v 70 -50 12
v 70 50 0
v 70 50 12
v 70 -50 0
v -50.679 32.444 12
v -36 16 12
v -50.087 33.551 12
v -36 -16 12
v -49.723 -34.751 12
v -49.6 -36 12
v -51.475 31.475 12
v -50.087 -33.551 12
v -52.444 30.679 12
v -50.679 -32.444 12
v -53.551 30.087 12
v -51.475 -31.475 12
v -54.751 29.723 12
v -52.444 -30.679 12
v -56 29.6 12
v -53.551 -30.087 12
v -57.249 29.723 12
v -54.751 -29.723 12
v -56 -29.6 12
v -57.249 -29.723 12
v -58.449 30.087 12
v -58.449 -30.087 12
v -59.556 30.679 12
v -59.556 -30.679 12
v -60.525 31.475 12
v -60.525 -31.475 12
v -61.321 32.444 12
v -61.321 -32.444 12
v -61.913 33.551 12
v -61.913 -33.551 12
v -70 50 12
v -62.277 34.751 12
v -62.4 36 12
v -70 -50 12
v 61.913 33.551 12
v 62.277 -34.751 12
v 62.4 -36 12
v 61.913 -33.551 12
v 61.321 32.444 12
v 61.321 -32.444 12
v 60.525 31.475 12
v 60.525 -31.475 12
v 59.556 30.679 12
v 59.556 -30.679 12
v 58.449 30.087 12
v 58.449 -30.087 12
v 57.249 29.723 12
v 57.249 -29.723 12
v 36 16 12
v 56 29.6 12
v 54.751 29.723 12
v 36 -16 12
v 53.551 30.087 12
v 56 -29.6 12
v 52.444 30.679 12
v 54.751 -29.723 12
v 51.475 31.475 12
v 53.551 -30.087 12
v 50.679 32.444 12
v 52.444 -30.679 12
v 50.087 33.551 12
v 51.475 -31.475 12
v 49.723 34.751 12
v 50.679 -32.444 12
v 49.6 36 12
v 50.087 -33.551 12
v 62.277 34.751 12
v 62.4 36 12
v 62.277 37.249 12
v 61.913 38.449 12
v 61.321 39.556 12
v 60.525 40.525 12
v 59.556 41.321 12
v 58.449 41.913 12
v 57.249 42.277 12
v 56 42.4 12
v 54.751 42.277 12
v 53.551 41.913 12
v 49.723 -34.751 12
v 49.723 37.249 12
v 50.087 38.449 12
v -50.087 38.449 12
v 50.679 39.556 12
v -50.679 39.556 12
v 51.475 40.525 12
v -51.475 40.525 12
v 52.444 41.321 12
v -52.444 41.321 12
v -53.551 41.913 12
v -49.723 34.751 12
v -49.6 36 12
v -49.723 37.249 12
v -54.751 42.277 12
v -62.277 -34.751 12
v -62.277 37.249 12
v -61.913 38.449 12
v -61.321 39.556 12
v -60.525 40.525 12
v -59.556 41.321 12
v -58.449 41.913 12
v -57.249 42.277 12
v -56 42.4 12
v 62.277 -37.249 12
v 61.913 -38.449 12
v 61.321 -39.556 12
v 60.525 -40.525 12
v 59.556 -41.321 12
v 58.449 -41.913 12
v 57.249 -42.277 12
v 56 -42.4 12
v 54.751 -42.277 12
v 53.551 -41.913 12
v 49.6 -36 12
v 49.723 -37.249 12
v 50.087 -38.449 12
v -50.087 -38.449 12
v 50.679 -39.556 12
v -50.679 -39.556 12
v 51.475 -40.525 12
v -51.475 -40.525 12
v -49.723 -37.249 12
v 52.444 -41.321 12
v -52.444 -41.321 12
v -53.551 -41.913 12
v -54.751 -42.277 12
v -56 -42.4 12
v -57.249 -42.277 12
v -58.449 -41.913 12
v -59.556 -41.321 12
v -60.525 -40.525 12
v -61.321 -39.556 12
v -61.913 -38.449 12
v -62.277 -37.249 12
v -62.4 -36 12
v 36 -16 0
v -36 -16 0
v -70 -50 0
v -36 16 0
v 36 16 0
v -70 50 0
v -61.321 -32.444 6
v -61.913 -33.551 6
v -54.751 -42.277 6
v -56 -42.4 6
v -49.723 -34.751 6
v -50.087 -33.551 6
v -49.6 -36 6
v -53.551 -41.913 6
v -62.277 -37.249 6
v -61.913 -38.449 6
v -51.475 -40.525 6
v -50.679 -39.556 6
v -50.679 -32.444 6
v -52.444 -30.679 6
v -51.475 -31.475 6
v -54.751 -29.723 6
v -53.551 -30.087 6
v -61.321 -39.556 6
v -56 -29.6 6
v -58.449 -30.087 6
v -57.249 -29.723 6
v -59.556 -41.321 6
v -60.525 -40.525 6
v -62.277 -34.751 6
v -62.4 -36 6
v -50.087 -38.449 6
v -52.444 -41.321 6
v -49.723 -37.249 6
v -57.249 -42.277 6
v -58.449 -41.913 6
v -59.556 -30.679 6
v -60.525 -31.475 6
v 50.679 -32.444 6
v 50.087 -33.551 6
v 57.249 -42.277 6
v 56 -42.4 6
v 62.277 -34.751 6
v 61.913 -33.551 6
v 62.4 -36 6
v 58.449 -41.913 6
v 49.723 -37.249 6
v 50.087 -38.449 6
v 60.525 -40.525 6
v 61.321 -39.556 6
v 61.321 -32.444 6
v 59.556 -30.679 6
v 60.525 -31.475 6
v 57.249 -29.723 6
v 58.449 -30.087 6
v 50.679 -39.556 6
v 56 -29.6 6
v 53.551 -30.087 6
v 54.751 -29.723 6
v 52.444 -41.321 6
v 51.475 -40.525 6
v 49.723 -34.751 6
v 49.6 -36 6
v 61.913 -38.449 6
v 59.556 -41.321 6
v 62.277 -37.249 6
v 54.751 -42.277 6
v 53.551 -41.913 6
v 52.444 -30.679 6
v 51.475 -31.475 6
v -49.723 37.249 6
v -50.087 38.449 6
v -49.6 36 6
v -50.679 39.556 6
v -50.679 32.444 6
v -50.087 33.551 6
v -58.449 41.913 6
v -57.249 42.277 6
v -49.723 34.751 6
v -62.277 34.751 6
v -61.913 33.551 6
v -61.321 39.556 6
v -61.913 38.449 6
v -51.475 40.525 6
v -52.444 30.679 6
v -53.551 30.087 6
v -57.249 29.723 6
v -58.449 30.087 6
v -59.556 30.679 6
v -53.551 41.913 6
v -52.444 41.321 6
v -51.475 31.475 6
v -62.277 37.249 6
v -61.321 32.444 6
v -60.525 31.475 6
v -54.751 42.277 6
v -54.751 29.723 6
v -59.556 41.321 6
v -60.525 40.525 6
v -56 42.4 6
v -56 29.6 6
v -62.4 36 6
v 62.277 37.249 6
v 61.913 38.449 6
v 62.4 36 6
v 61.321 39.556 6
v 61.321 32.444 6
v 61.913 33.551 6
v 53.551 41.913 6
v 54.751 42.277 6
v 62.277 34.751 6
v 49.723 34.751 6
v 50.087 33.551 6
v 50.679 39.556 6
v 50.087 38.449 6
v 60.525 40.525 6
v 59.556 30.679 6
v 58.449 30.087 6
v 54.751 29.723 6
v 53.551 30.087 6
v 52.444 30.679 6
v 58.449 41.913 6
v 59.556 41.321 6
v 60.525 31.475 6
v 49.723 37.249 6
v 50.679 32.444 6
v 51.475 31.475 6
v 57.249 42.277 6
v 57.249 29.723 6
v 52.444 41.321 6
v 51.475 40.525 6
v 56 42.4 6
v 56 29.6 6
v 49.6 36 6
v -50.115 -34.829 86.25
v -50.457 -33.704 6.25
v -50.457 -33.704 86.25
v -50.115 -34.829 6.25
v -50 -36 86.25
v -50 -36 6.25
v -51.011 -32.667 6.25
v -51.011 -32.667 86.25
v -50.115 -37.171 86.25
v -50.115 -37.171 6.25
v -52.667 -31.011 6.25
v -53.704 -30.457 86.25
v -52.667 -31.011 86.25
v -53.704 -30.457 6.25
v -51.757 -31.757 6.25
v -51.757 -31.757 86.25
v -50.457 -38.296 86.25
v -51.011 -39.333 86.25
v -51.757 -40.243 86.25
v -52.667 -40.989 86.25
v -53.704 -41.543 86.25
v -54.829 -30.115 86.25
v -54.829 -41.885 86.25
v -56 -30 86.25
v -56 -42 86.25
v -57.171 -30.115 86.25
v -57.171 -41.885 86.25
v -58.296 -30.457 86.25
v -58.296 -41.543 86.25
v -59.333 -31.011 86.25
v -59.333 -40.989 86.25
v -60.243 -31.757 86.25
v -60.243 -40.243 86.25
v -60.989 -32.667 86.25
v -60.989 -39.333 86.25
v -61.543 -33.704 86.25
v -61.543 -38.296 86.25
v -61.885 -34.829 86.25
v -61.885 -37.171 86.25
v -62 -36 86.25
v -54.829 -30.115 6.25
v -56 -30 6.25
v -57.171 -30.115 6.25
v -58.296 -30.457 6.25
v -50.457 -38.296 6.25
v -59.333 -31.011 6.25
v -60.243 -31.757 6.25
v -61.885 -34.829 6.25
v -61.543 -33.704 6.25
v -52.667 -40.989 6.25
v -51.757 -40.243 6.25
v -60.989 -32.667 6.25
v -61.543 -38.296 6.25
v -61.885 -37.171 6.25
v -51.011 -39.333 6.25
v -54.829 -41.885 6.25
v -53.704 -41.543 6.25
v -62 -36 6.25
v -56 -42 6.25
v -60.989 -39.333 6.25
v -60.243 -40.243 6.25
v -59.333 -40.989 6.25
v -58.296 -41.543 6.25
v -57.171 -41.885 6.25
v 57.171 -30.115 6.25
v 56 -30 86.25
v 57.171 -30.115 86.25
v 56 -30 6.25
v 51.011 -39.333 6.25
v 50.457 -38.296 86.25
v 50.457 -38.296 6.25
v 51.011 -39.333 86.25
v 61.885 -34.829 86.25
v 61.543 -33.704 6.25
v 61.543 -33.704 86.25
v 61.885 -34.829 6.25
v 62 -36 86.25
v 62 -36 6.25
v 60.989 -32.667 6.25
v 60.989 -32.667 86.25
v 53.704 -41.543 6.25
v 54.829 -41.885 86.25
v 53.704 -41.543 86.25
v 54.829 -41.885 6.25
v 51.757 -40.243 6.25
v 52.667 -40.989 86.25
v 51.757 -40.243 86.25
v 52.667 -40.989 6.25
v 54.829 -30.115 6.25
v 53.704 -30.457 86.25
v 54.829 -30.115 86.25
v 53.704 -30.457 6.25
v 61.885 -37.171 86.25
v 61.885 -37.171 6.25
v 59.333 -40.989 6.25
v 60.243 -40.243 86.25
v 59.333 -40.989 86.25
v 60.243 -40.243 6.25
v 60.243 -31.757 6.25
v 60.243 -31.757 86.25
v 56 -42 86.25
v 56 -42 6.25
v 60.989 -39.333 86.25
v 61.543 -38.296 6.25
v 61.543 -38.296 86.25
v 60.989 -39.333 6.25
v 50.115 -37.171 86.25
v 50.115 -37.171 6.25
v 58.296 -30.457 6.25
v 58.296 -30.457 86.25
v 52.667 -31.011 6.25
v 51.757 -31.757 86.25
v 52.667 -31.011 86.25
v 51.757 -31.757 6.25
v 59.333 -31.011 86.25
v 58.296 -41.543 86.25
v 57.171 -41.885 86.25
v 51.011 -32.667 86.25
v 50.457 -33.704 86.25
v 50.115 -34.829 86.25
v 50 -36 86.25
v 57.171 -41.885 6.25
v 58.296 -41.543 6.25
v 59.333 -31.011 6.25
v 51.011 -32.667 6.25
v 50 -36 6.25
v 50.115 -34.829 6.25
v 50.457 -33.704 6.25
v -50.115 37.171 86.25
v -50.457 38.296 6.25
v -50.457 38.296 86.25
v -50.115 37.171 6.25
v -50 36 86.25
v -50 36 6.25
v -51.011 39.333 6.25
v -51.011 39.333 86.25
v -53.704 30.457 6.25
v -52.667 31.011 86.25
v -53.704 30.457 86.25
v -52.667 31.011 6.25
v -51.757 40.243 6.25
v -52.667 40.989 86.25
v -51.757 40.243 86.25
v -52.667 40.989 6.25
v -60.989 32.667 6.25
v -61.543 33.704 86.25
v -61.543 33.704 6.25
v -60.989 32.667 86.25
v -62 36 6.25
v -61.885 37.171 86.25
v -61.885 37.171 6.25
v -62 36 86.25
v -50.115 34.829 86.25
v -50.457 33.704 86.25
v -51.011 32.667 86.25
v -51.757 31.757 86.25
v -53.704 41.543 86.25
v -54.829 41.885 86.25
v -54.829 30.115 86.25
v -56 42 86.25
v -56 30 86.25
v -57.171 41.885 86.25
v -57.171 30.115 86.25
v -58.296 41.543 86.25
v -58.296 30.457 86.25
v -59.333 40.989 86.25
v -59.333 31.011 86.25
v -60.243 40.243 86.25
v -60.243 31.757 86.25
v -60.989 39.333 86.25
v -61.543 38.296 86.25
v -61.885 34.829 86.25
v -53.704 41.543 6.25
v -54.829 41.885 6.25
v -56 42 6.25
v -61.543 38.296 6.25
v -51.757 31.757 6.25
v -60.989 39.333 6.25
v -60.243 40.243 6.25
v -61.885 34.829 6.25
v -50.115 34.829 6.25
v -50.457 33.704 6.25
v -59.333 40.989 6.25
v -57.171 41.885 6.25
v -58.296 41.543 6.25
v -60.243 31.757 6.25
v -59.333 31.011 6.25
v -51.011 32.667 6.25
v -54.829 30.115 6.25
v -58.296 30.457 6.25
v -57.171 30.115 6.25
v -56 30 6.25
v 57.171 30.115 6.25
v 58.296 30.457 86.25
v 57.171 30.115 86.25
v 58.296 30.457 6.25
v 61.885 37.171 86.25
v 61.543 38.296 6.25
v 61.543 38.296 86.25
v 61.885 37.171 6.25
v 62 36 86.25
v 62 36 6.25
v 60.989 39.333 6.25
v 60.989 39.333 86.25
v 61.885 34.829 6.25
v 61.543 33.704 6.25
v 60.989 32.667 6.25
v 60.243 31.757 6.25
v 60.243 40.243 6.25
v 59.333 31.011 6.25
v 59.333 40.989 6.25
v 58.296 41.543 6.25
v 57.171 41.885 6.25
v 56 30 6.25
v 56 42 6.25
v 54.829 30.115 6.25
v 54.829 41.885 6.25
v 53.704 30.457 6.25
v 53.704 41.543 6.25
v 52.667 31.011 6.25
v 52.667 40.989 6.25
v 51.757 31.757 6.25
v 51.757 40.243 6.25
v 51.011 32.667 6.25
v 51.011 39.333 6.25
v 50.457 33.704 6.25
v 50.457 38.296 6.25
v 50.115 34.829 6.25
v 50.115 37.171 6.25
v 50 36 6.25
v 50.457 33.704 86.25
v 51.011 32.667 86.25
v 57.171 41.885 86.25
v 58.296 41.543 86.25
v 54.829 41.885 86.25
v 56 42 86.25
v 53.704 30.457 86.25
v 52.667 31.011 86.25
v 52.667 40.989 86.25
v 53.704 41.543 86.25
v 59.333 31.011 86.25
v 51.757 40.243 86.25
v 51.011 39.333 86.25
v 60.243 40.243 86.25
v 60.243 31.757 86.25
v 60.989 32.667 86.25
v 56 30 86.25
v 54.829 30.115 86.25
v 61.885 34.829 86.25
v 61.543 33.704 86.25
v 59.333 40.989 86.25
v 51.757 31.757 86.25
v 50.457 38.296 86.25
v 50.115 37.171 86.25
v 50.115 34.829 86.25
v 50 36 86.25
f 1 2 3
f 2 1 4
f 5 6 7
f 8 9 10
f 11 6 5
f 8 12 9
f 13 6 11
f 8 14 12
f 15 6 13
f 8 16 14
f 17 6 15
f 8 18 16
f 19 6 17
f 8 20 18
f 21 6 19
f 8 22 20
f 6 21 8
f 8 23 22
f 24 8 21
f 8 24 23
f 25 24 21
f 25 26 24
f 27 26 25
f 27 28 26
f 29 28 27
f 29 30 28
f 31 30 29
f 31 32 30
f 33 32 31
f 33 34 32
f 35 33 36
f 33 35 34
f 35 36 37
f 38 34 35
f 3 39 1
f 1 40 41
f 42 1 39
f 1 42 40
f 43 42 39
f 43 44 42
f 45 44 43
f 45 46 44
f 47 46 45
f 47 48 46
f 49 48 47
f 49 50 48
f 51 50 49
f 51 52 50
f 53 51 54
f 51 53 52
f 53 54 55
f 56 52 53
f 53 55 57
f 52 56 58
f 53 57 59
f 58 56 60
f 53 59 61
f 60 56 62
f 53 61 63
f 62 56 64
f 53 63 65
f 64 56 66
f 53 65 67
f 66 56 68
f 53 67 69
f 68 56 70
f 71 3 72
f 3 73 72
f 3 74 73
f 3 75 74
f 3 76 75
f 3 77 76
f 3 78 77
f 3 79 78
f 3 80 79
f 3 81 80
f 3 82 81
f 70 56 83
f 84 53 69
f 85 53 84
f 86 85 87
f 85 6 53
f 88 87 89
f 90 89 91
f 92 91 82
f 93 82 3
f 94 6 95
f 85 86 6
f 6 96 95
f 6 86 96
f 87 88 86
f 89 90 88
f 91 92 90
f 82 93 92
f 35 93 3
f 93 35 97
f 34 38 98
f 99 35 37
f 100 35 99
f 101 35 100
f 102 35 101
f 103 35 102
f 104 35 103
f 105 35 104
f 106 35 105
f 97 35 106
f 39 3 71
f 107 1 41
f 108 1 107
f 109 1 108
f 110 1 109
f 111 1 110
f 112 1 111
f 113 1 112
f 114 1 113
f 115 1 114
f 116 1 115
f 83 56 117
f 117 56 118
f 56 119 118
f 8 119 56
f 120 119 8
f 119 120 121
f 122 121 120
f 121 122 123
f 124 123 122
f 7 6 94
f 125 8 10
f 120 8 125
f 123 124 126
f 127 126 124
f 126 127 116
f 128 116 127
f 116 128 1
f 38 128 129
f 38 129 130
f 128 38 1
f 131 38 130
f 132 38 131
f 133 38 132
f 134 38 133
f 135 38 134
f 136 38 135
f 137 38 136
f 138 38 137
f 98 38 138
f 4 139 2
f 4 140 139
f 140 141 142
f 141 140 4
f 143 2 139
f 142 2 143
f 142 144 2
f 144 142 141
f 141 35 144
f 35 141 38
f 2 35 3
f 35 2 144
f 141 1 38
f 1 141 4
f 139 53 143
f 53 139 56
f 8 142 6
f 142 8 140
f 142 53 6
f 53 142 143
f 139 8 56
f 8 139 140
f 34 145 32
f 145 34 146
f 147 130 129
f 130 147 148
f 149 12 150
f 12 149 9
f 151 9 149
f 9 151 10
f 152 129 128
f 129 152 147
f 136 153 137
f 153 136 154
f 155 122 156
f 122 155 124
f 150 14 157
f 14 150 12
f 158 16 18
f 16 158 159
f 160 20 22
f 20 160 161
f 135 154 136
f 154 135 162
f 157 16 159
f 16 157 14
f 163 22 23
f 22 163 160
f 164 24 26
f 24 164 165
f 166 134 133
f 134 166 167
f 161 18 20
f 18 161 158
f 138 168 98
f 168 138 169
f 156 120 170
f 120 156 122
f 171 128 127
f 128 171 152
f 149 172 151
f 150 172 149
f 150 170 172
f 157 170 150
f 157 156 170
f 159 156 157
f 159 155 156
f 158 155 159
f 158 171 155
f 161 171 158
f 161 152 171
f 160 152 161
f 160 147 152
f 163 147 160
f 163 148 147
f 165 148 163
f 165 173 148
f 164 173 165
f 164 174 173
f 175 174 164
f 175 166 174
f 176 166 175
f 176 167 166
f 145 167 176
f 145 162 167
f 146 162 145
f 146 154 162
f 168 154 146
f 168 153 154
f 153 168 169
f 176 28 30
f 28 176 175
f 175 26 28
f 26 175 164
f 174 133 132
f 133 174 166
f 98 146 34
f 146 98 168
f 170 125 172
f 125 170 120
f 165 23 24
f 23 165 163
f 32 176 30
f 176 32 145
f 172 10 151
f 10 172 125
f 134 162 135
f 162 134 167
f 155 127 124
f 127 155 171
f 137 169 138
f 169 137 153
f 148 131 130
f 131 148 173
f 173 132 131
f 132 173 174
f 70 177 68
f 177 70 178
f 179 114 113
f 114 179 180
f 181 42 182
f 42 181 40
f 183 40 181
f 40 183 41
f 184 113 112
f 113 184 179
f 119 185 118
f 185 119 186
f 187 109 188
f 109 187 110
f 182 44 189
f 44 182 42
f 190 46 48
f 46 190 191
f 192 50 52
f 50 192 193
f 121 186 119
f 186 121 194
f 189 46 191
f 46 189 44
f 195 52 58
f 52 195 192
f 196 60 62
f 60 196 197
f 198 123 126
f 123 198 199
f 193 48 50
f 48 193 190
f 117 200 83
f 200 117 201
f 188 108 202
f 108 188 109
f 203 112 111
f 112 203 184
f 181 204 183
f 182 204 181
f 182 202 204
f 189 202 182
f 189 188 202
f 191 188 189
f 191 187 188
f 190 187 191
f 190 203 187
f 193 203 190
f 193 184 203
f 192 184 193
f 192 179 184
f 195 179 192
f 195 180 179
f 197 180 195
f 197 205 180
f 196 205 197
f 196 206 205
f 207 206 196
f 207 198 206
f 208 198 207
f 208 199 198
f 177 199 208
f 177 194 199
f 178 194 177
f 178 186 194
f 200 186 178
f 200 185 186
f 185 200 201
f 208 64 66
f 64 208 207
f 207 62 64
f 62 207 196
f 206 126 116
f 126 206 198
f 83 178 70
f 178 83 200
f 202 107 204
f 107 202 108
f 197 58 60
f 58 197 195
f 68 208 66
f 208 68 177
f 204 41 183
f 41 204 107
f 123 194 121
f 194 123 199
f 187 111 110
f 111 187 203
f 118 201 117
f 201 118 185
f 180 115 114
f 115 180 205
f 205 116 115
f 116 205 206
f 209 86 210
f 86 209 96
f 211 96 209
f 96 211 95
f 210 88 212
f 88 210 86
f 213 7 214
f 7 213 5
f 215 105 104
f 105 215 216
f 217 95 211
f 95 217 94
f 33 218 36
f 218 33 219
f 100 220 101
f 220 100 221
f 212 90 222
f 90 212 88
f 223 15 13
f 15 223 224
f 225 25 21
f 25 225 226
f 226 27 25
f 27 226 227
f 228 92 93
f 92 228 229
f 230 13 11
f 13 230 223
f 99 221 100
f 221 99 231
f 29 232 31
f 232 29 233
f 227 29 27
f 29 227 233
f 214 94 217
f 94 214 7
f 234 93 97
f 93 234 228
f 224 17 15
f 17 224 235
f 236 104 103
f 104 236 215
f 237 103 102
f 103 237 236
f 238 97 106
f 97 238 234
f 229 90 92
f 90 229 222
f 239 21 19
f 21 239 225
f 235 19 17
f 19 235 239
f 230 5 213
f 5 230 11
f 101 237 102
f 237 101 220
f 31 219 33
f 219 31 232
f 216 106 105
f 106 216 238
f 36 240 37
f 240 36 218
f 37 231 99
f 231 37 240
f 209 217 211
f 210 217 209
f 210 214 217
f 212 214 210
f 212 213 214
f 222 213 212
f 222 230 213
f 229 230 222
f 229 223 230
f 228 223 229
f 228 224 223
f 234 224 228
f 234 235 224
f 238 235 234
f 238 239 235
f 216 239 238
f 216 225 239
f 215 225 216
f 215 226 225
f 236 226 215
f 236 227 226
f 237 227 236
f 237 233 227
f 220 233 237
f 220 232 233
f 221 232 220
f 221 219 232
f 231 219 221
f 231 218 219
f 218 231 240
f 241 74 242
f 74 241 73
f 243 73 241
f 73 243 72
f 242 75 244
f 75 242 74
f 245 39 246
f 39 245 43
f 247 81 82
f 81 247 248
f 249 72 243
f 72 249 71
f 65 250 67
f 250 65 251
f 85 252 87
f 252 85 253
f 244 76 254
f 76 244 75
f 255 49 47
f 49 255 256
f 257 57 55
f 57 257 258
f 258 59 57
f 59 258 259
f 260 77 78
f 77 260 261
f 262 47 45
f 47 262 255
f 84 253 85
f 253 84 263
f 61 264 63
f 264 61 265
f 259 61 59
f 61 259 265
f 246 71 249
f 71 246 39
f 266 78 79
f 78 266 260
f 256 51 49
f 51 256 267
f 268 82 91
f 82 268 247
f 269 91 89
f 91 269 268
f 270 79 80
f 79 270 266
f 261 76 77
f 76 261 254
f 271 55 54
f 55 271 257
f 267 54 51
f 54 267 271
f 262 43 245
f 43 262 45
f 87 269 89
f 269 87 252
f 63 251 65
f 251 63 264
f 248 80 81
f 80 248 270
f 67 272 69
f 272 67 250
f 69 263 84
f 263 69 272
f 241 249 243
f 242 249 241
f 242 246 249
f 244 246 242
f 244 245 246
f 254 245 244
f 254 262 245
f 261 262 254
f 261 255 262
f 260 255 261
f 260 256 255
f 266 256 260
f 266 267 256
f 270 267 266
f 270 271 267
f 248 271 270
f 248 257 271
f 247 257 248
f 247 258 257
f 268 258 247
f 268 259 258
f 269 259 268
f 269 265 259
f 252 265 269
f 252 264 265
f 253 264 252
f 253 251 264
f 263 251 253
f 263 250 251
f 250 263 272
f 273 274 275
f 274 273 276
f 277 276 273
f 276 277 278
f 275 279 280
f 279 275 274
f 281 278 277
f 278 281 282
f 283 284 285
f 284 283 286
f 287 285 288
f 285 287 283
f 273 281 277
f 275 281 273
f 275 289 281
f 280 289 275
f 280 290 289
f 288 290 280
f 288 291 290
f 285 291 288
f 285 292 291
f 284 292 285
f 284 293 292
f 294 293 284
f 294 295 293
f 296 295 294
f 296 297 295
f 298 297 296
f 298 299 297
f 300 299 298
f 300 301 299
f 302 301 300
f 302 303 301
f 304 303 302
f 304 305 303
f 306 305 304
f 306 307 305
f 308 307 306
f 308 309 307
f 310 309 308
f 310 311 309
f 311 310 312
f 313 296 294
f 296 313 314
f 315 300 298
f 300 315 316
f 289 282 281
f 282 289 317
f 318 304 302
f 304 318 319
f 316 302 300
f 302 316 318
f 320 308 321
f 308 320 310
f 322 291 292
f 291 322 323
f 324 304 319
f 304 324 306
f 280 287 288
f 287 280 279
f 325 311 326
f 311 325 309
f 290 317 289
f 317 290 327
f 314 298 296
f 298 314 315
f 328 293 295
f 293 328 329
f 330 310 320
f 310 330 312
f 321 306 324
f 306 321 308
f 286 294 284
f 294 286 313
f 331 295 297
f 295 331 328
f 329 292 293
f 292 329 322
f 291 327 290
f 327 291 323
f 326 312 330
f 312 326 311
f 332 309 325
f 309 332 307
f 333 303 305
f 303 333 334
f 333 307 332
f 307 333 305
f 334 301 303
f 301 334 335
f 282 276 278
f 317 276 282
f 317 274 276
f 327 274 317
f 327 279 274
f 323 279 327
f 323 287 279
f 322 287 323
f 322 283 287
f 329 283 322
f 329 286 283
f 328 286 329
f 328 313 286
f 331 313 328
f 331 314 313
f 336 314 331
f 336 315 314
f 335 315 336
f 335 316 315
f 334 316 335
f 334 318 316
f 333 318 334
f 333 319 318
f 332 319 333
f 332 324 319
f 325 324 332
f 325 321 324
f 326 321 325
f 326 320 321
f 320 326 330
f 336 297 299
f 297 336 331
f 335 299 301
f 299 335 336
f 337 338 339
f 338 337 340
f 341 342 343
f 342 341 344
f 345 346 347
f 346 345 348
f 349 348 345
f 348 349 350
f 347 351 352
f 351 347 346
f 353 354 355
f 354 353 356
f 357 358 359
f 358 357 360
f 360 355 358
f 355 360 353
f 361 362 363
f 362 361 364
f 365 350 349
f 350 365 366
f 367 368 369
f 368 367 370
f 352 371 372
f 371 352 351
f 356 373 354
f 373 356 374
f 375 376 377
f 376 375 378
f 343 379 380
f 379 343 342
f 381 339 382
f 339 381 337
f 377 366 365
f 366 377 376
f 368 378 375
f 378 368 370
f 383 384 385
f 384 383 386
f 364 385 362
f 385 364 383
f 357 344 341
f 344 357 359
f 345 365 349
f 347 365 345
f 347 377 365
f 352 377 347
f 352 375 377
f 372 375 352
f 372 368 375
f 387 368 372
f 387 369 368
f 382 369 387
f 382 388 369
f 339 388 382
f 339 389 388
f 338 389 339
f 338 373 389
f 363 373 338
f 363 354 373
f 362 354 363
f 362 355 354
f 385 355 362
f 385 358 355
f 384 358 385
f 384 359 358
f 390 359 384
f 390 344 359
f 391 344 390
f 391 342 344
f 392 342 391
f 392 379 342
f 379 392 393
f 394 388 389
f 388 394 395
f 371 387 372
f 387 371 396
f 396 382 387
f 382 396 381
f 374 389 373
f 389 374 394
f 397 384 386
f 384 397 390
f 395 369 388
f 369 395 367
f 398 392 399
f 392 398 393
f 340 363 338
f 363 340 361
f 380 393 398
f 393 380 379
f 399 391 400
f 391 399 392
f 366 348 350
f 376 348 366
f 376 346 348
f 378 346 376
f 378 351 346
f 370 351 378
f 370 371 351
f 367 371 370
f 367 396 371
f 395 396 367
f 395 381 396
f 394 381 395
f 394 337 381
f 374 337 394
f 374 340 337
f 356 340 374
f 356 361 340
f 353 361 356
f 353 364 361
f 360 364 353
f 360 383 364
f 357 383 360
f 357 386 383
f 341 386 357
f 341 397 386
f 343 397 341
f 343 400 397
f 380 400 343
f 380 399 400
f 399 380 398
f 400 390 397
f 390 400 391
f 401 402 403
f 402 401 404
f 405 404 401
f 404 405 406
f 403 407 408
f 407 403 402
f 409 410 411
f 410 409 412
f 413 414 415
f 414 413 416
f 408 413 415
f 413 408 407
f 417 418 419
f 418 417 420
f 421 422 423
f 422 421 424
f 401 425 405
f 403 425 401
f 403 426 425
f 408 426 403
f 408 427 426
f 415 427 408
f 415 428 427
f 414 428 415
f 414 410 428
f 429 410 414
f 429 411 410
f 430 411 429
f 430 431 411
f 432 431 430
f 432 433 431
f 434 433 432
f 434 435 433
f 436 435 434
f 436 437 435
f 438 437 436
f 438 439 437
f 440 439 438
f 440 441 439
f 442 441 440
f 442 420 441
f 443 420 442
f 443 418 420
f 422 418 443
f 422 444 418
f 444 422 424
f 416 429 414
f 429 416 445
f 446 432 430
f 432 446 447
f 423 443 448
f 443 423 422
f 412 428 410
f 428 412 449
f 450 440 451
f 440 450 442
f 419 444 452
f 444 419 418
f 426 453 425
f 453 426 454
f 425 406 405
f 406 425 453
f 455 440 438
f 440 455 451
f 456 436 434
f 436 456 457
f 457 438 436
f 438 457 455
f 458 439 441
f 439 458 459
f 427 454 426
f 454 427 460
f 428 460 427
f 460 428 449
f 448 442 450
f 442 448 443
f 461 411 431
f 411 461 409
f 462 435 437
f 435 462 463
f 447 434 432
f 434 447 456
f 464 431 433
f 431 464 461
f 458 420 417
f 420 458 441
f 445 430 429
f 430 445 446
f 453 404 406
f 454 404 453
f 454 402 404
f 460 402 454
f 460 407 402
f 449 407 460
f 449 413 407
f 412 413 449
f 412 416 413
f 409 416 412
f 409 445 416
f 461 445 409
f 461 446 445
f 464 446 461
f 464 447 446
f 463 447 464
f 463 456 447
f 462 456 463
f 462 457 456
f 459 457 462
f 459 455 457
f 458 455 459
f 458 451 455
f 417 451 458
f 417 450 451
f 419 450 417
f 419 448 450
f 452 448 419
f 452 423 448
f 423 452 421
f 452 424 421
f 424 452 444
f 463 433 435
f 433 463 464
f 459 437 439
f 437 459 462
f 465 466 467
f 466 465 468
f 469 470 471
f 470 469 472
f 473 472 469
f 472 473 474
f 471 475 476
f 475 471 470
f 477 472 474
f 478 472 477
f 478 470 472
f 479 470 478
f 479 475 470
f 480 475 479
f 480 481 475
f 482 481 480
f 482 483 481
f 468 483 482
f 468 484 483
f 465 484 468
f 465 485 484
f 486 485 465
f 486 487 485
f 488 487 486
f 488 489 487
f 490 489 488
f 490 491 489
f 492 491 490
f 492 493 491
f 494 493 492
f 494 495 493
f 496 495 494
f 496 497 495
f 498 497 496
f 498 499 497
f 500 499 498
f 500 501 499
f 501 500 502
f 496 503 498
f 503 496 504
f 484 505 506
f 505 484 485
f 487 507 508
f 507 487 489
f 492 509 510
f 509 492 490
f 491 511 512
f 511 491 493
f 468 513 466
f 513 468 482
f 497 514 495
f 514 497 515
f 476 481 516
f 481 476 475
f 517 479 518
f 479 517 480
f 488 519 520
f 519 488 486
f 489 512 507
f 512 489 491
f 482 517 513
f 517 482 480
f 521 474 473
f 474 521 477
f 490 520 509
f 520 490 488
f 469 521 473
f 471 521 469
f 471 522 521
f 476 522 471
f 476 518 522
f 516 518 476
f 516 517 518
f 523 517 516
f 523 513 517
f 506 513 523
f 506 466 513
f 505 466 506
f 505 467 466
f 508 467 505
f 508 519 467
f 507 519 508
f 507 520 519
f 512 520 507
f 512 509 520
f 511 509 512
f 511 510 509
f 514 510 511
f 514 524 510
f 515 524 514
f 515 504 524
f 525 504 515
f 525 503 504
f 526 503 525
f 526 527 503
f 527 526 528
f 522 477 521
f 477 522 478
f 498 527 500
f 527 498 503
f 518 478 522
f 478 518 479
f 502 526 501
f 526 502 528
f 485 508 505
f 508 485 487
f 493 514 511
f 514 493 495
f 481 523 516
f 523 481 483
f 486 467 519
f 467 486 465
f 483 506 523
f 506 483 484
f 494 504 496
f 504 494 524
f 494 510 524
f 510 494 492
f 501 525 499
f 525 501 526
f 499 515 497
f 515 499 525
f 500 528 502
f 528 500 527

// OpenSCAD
$fn = 32;

// ------------------------------------------------------------------------
// Frame with four posts: 140 x 100 mm frame, four d12 posts
// Every part is its own module, assembly() places them once.
// ------------------------------------------------------------------------

// --- part 1 ---
module base_frame() {
  difference() {
    translate([-70, -50, 0]) cube([140, 100, 12]);
    translate([-36, -16, -1]) cube([72, 32, 14]);
    translate([-56, -36, 6]) cylinder(h = 7, d = 12.8);
    translate([56, -36, 6]) cylinder(h = 7, d = 12.8);
    translate([-56, 36, 6]) cylinder(h = 7, d = 12.8);
    translate([56, 36, 6]) cylinder(h = 7, d = 12.8);
  }
}

// --- part 2 ---
module post1() {
  cylinder(h = 80, d = 12);
}

// --- part 3 ---
module post2() {
  cylinder(h = 80, d = 12);
}

// --- part 4 ---
module post3() {
  cylinder(h = 80, d = 12);
}

// --- part 5 ---
module post4() {
  cylinder(h = 80, d = 12);
}

// --- assembly ---
module assembly() {
  translate([0, 0, 0]) rotate([0, 0, 0]) base_frame();
  translate([-56, -36, 6.25]) rotate([0, 0, 0]) post1();
  translate([56, -36, 6.25]) rotate([0, 0, 0]) post2();
  translate([-56, 36, 6.25]) rotate([0, 0, 0]) post3();
  translate([56, 36, 6.25]) rotate([0, 0, 0]) post4();
}

assembly();
